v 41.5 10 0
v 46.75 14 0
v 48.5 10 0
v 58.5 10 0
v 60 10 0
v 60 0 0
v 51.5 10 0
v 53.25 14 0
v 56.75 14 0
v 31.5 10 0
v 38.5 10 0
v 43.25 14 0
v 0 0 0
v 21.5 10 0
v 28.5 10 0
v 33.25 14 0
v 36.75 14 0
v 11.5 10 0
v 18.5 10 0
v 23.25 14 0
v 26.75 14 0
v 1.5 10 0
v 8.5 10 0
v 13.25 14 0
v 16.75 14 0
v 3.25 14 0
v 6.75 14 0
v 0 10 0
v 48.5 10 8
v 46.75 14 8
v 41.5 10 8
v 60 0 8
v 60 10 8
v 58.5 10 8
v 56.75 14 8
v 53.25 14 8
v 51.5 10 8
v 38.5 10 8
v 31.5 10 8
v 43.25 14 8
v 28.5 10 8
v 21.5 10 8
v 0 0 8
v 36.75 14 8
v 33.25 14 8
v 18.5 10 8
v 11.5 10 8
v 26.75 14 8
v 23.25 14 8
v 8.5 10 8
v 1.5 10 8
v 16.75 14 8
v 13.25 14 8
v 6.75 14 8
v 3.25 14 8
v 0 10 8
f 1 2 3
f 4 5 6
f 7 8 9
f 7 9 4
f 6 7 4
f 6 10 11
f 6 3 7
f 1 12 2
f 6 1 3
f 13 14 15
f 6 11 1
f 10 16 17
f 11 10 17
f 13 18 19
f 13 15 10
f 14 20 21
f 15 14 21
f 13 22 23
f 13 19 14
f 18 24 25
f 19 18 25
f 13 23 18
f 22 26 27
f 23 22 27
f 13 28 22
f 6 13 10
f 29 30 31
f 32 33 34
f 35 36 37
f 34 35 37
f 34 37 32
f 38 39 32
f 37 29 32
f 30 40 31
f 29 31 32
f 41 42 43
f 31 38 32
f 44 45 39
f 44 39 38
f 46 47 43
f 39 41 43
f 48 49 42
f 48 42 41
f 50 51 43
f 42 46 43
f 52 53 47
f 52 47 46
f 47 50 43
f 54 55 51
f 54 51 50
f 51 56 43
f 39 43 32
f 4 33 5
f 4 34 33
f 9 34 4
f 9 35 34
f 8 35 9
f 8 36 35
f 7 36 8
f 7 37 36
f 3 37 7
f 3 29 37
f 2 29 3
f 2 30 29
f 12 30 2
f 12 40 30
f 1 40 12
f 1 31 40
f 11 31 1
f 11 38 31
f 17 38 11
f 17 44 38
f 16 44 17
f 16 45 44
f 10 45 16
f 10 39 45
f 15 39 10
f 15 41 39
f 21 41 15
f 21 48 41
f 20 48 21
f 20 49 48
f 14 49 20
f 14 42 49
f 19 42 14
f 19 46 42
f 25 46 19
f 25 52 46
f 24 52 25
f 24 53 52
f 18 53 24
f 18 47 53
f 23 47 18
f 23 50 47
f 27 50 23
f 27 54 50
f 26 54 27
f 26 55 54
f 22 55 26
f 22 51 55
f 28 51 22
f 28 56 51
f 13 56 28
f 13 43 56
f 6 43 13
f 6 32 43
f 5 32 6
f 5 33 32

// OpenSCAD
$fn = 32;

// ----------------------------------------------------------------------
// Gear rack: 6 teeth, pitch 10 mm
// ----------------------------------------------------------------------

// --- parameters (mm) ---
teeth = 6;                // number of teeth
pitch = 10;               // tooth pitch, X
root_w = 7;               // tooth width at the root
tip_w = 3.5;              // tooth width at the tip
base_h = 10;              // rack body height, Y
tooth_h = 4;              // tooth height above the body
plate_t = 8;              // rack width, Z (extrusion height)
fit_tol = 0.1;            // declared fit tolerance (prompt contract)
free_tol = 0.3;           // declared free tolerance (prompt contract)

rack_l = teeth * pitch;  // overall length
total_h = base_h + tooth_h;  // overall height

profile = [[0, 0], [60, 0], [60, 10], [58.5, 10], [56.75, 14], [53.25, 14], [51.5, 10], [48.5, 10], [46.75, 14], [43.25, 14], [41.5, 10], [38.5, 10], [36.75, 14], [33.25, 14], [31.5, 10], [28.5, 10], [26.75, 14], [23.25, 14], [21.5, 10], [18.5, 10], [16.75, 14], [13.25, 14], [11.5, 10], [8.5, 10], [6.75, 14], [3.25, 14], [1.5, 10], [0, 10]];  // primary outline, 28 points, counter clockwise

// --- the one profile operation ---
linear_extrude(height = plate_t) polygon(points = profile);
